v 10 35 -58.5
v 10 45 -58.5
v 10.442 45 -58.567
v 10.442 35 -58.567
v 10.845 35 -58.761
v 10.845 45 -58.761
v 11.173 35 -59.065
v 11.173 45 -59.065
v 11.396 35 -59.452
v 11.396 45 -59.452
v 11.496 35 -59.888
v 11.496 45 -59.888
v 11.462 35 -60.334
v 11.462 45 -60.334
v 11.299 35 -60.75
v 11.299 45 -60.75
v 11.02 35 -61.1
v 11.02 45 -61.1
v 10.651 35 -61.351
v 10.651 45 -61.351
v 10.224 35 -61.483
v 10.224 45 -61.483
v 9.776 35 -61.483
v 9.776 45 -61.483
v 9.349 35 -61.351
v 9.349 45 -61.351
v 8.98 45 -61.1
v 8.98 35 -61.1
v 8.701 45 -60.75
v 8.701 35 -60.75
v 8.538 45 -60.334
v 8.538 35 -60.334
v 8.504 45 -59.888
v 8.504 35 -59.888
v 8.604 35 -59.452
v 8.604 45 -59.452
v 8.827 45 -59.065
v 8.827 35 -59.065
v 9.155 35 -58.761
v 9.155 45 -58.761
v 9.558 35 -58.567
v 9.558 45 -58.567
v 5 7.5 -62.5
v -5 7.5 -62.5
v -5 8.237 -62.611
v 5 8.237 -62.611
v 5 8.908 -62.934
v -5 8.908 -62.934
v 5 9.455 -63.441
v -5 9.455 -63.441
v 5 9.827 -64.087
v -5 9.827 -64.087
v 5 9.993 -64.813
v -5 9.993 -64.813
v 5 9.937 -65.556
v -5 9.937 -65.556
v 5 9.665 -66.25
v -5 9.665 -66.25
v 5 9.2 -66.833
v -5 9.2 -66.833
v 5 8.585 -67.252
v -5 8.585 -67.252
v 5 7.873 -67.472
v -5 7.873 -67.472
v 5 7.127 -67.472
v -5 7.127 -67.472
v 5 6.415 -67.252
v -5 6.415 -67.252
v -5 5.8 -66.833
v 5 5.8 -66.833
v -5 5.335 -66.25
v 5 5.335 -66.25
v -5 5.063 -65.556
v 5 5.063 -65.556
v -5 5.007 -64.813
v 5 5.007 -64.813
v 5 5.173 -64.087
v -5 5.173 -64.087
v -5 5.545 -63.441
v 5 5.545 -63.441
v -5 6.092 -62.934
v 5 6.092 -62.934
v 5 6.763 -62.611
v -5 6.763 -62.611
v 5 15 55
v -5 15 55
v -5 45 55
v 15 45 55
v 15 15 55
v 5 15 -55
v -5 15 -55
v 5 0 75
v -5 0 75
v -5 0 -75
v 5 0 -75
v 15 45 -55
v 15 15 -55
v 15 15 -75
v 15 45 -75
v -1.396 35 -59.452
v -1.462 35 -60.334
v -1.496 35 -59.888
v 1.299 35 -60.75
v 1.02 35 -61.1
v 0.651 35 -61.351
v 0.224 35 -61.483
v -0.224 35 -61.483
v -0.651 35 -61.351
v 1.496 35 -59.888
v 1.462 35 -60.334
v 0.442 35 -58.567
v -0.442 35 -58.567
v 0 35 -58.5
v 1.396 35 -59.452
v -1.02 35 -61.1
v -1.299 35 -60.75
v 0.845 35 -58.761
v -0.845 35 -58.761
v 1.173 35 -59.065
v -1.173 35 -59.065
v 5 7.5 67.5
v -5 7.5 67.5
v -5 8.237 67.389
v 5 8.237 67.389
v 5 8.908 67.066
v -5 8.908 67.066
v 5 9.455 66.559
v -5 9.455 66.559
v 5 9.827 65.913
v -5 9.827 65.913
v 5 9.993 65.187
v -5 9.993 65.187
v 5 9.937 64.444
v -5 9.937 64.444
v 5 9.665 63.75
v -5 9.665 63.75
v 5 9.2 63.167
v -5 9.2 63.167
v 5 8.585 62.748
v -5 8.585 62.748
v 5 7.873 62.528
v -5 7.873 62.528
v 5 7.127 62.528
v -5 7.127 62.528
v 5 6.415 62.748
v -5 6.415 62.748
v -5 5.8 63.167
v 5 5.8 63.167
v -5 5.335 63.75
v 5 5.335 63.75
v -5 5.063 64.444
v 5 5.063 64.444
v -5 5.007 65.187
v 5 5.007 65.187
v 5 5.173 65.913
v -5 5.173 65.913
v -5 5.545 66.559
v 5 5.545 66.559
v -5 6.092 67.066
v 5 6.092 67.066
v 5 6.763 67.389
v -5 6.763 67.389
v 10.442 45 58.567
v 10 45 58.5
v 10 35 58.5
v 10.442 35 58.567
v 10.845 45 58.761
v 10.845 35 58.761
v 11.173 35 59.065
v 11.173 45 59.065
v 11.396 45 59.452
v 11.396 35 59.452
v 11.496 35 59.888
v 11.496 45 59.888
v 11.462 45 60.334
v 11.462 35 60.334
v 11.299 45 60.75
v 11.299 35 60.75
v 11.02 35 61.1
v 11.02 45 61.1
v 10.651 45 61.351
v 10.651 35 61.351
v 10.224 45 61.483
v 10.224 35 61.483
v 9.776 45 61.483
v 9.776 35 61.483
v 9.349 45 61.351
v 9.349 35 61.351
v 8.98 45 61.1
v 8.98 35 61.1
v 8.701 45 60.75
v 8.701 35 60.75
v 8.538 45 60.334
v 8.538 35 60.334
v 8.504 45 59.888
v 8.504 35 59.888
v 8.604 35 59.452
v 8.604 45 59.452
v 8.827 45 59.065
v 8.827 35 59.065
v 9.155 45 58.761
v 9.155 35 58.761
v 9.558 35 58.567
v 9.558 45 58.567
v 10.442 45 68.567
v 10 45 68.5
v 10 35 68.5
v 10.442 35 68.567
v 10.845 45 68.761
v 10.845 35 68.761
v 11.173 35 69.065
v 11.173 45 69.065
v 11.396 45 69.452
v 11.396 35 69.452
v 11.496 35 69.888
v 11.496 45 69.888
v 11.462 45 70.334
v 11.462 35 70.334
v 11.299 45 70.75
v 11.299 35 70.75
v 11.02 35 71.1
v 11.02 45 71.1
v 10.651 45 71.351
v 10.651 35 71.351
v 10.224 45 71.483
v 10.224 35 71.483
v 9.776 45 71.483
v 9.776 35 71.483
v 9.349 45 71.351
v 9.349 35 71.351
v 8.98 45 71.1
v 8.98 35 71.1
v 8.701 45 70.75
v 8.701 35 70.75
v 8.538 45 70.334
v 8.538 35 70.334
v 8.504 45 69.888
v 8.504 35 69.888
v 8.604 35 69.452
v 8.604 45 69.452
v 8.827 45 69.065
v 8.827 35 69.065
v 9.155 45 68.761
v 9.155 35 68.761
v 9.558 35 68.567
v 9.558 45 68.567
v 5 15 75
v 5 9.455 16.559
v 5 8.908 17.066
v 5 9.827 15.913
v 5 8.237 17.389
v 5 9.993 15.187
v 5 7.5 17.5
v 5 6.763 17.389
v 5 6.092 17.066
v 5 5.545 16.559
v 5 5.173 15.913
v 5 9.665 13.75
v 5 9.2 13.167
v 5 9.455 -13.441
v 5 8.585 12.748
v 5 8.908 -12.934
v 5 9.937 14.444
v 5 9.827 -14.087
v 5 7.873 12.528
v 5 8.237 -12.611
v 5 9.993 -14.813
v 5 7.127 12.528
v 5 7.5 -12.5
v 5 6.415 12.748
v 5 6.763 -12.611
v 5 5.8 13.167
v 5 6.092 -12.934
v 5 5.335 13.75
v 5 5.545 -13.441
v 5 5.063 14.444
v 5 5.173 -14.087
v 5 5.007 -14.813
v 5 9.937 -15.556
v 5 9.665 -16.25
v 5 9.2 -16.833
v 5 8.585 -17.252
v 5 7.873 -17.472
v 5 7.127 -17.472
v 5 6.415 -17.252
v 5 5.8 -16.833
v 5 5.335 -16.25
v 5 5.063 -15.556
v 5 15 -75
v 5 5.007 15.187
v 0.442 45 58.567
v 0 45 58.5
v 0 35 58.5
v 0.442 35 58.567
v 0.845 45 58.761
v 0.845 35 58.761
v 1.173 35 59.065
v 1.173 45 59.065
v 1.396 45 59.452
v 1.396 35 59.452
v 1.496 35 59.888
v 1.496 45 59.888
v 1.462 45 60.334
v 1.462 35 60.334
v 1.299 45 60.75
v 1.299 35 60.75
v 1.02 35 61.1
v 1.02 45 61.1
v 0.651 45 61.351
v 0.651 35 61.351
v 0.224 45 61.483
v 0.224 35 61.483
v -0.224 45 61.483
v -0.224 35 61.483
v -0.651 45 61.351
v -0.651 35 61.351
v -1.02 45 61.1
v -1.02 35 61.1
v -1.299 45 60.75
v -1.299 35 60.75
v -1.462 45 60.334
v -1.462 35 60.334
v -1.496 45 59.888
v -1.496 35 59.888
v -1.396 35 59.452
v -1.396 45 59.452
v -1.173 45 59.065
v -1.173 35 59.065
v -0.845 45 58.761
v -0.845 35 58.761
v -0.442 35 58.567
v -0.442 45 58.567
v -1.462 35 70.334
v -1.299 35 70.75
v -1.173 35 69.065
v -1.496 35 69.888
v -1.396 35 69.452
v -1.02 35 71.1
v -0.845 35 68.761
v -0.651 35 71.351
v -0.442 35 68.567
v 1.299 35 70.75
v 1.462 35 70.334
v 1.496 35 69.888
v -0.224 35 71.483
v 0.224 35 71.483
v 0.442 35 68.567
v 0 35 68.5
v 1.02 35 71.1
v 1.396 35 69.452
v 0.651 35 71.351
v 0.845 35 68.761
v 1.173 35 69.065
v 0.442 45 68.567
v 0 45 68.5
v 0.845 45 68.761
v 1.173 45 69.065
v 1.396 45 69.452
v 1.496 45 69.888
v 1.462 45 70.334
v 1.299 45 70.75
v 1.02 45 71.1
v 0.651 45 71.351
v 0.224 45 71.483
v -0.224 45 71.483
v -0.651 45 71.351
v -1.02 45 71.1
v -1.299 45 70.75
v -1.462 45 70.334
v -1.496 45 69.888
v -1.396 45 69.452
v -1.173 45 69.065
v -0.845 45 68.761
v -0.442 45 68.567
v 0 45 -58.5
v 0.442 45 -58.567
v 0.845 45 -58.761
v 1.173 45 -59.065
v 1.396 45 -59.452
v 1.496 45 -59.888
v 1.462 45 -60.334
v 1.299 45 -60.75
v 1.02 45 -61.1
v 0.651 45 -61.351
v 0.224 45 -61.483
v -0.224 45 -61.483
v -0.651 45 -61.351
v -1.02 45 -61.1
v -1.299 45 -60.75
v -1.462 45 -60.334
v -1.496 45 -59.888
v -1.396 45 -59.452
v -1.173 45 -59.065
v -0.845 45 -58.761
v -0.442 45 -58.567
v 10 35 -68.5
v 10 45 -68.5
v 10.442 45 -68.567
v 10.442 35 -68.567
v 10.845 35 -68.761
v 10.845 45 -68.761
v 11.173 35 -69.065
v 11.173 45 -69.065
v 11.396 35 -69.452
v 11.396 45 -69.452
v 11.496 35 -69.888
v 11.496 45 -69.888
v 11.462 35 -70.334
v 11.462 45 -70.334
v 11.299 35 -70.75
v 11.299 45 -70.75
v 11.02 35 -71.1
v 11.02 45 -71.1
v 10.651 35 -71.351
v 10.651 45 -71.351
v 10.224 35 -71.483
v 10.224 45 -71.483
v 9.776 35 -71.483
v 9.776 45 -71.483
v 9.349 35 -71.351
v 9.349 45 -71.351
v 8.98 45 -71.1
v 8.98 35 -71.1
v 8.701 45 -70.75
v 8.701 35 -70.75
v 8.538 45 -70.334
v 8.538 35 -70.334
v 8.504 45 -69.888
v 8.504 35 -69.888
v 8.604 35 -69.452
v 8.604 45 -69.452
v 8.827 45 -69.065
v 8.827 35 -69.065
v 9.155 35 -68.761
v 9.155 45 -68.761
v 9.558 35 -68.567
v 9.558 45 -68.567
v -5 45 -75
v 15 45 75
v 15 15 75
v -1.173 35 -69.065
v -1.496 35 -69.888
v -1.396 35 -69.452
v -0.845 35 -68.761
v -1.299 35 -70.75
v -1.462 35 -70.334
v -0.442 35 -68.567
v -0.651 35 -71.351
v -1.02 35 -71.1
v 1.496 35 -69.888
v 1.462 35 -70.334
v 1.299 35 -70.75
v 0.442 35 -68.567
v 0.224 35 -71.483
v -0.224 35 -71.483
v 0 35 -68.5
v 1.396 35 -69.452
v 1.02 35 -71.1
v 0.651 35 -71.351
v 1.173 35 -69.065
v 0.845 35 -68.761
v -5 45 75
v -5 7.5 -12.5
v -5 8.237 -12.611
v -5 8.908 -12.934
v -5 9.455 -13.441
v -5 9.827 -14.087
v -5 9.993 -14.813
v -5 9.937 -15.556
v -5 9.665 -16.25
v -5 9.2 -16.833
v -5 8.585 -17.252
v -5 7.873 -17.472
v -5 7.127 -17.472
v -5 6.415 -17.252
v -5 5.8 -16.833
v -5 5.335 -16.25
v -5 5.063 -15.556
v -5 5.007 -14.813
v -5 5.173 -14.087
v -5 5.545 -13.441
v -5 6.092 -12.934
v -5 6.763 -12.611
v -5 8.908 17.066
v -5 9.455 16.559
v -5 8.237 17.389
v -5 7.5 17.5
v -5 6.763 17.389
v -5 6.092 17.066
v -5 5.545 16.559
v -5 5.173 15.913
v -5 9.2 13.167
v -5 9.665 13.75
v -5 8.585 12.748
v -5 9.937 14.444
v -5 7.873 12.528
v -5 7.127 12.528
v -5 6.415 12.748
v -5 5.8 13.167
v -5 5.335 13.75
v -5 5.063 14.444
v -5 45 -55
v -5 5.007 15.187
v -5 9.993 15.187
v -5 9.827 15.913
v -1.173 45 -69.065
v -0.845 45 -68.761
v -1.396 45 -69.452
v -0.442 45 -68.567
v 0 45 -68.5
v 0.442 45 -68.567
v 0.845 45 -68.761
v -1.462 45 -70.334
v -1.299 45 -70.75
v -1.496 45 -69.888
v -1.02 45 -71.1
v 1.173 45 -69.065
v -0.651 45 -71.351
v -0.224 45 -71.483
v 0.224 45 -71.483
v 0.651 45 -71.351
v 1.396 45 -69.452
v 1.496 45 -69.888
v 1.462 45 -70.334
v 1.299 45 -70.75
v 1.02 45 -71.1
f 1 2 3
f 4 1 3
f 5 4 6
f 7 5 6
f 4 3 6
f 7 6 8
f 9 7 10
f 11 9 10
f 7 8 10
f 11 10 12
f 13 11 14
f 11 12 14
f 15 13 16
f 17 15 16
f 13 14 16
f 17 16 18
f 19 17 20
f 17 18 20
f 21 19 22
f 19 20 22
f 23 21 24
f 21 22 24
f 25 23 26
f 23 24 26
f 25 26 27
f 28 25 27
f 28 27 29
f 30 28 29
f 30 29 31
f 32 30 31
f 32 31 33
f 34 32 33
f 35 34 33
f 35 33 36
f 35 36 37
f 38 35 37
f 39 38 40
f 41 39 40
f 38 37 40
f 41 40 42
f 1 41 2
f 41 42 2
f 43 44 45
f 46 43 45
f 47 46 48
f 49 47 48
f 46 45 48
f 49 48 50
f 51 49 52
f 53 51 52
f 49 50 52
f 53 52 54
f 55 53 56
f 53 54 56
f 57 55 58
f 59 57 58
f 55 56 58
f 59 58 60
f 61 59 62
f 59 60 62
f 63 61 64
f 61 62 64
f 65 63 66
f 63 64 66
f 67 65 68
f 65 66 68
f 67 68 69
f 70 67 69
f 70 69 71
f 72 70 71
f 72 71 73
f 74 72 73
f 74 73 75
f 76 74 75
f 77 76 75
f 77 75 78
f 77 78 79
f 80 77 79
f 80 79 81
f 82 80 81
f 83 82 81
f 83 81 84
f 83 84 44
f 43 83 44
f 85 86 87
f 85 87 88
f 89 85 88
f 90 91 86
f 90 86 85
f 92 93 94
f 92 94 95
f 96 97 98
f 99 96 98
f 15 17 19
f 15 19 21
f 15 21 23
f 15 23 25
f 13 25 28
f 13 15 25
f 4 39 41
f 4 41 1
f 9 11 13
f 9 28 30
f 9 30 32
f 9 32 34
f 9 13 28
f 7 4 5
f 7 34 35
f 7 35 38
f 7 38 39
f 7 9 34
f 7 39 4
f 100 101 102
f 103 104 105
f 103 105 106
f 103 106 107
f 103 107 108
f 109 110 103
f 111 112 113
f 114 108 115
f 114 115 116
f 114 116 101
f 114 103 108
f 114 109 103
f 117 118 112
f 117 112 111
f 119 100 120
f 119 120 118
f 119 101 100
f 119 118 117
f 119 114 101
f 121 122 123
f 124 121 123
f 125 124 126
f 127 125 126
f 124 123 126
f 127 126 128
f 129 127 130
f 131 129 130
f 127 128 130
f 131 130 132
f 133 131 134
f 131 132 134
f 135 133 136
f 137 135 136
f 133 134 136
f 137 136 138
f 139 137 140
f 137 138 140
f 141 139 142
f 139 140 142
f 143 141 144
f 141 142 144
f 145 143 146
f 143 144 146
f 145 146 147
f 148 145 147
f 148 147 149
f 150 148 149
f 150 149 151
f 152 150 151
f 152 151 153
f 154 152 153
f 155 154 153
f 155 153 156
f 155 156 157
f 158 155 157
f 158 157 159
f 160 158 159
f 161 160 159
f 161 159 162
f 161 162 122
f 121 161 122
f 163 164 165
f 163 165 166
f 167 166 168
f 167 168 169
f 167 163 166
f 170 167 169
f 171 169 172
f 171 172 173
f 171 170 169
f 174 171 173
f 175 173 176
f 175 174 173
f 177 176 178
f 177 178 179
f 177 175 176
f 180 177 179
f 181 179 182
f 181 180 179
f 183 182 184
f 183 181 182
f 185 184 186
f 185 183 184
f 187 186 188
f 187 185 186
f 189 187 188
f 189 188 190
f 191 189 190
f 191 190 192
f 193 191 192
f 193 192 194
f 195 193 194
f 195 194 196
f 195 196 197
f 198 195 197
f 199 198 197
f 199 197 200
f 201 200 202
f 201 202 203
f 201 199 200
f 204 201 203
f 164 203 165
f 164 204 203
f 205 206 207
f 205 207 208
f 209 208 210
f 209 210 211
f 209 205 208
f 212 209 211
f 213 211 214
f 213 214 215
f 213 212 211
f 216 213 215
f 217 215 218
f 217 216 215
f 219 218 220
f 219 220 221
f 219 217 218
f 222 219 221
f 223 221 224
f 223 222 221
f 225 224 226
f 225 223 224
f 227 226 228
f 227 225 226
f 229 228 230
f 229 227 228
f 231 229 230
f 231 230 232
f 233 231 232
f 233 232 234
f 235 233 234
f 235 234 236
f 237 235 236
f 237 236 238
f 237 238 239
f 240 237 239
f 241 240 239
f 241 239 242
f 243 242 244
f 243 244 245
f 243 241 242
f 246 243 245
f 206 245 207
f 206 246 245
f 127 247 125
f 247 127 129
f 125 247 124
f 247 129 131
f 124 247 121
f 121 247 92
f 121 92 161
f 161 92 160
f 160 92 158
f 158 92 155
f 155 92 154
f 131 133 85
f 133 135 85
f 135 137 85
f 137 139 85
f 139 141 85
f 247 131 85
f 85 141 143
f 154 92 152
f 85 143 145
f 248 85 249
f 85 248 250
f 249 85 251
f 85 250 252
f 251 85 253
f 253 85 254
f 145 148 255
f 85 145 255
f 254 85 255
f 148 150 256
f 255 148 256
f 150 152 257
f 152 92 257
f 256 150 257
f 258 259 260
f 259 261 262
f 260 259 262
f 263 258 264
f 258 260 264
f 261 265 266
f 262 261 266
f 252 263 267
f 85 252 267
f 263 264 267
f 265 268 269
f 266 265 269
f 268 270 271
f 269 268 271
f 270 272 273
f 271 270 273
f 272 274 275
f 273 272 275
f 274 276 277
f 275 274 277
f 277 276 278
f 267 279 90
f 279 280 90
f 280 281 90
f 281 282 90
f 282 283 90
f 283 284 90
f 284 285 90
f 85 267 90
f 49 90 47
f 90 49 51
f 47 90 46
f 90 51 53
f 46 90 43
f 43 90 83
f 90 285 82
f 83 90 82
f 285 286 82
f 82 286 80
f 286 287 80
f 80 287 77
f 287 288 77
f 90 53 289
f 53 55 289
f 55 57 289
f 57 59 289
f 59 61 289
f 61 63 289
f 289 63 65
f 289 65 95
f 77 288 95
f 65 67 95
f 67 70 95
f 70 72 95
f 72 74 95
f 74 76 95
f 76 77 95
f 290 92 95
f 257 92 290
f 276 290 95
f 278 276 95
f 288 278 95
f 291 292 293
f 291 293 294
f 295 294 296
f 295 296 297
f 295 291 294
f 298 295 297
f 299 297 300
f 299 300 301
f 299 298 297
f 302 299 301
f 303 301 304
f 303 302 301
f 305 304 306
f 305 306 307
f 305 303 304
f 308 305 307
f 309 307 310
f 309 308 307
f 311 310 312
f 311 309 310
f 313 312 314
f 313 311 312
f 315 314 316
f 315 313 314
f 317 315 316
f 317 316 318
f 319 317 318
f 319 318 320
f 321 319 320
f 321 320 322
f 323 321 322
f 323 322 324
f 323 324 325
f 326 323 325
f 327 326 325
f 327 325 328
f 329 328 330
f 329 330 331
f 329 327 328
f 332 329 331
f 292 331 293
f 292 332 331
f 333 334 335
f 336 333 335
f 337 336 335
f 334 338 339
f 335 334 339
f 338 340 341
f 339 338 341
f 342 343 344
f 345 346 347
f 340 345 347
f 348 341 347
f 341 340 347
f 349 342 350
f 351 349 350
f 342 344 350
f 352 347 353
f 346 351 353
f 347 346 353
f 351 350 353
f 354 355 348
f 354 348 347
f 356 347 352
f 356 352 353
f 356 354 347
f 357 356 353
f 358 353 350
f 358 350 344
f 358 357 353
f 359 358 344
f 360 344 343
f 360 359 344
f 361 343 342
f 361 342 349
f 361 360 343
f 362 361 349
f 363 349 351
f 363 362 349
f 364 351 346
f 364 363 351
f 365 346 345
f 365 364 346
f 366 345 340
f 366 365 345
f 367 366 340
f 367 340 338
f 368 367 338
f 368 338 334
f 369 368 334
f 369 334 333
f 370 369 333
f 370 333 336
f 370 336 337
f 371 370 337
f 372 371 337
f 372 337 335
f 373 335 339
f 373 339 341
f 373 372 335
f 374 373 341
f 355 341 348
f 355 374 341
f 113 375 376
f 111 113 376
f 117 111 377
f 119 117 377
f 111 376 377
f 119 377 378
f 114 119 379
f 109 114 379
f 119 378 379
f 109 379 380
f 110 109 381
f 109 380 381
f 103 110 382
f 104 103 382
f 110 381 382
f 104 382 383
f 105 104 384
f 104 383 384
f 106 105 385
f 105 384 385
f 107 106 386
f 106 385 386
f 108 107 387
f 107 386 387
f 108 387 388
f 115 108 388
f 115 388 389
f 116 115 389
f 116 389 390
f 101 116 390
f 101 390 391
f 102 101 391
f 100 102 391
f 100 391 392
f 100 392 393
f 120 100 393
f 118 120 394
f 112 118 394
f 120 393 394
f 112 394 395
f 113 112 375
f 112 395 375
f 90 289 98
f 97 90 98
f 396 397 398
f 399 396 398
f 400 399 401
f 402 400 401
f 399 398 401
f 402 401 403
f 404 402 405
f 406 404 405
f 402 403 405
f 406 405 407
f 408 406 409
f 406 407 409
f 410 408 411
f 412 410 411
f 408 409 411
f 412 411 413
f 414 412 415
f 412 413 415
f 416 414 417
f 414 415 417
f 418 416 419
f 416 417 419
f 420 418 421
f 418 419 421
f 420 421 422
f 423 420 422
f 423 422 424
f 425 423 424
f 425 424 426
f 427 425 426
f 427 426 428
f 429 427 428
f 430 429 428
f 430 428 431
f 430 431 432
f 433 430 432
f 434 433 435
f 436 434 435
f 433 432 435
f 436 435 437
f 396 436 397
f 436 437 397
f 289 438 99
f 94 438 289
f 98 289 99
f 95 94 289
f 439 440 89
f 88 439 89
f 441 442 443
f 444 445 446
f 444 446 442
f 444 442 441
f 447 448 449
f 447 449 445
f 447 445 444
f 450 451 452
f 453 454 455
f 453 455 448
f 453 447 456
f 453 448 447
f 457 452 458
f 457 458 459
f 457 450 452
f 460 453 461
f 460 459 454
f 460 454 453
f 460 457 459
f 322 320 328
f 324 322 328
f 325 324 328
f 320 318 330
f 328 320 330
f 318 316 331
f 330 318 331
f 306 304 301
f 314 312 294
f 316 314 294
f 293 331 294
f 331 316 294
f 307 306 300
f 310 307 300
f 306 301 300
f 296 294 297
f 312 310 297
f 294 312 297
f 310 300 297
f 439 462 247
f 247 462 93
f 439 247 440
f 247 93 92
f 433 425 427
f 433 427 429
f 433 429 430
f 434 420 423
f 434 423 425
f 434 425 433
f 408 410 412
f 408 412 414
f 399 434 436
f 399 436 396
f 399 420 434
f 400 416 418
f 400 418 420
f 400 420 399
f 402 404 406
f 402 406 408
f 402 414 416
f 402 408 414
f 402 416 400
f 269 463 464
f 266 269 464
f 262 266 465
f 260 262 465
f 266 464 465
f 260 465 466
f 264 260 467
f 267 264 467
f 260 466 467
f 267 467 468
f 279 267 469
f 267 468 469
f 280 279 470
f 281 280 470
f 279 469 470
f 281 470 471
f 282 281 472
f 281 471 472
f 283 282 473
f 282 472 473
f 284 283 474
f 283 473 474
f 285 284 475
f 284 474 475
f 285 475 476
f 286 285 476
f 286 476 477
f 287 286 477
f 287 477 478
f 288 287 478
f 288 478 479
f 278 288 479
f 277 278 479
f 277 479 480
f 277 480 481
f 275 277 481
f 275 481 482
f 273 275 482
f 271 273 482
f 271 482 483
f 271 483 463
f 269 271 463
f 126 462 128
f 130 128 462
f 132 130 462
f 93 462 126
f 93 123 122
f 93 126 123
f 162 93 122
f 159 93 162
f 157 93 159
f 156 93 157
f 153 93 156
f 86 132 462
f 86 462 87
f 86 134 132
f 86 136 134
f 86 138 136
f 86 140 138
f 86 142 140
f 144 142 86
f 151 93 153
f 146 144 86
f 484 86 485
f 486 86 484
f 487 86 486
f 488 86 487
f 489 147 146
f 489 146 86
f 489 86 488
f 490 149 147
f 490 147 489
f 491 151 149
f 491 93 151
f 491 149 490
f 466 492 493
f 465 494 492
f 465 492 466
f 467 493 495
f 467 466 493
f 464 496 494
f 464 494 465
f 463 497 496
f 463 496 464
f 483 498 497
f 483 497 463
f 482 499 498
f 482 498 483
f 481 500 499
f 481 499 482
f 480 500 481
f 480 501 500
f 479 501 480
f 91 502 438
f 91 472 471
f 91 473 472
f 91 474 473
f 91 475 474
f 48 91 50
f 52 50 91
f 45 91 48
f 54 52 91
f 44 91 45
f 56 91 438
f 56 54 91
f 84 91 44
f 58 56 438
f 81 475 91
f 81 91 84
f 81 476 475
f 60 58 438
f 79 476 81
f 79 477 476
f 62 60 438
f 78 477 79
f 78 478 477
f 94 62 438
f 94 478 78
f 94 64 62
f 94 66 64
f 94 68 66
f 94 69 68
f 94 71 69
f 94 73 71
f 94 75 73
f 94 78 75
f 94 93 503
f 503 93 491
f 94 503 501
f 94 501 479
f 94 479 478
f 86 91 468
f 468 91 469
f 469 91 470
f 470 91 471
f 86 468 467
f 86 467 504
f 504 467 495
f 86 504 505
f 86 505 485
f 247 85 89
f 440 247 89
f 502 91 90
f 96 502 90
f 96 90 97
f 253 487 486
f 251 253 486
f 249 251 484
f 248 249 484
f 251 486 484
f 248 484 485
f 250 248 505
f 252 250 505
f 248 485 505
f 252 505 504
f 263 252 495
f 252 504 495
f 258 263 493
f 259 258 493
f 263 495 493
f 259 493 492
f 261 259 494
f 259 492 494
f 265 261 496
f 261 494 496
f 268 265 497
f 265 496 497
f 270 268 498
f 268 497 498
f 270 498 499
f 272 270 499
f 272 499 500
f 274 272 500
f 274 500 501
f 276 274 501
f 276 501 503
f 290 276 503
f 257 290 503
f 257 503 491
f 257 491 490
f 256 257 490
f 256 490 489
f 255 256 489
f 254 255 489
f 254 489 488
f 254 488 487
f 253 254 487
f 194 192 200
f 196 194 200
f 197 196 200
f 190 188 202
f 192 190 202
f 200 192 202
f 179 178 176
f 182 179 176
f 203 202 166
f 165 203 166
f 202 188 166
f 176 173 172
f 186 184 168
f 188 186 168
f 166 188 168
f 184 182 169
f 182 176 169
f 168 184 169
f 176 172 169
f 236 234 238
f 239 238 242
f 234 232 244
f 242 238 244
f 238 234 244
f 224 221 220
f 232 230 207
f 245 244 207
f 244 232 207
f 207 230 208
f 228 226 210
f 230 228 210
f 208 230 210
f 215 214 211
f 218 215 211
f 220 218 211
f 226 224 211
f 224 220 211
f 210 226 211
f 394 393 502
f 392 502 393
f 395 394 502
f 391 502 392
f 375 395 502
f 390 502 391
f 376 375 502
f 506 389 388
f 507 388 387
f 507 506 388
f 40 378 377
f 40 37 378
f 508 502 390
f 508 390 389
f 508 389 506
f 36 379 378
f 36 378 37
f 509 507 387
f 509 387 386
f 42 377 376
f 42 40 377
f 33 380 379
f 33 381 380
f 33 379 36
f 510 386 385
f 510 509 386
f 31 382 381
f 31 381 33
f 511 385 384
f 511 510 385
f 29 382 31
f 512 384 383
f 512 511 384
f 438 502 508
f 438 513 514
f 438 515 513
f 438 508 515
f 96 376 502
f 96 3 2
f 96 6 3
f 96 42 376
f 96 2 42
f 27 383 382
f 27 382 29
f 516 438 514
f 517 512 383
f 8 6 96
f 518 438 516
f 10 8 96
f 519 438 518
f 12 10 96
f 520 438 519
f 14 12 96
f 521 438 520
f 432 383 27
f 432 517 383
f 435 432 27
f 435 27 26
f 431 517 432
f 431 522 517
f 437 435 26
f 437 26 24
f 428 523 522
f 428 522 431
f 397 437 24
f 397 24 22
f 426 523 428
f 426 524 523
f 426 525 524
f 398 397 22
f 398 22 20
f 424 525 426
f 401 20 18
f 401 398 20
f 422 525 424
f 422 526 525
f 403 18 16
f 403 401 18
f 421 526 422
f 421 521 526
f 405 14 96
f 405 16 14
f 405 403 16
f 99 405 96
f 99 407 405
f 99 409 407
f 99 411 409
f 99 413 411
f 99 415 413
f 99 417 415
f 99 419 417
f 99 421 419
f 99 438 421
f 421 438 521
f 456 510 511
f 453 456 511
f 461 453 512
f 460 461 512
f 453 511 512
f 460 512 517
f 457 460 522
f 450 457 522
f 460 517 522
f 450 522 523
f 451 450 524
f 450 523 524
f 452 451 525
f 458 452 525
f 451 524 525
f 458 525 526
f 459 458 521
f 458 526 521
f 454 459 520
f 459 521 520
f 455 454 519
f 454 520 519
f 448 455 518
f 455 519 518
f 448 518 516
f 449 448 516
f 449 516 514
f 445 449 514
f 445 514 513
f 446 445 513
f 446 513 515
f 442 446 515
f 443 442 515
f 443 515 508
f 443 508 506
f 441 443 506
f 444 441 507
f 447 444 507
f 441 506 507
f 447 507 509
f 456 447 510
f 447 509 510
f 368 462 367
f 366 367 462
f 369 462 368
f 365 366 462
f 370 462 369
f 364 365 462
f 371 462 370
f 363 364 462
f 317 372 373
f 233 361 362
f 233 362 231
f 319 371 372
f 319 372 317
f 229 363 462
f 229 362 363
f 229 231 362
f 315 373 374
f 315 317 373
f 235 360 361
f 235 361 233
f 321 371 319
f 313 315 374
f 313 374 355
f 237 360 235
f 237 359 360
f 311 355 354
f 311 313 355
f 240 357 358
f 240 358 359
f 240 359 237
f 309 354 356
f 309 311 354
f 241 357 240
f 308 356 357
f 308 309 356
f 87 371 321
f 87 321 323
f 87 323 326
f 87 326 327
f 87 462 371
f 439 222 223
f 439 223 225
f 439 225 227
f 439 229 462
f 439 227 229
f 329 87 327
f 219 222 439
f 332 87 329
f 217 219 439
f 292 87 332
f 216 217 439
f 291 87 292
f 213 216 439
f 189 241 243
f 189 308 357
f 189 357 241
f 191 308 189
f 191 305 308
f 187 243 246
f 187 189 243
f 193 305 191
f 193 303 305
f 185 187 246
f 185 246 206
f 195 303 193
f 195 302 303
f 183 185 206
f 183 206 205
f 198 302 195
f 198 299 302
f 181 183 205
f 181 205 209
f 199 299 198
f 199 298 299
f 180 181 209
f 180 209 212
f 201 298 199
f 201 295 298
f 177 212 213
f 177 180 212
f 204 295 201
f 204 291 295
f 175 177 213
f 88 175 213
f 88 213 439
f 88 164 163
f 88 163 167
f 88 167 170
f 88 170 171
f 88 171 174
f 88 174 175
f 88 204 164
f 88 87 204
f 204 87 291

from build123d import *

# Parameters (mm, degrees)
SKETCH_1_W          = 10
SKETCH_1_H          = 150
EXTRUDE_1_DEPTH     = 15
SKETCH_2_W          = 20
SKETCH_2_H          = 20
EXTRUDE_2_DEPTH     = 30
SKETCH_3_R          = 2.5
CUT_EXTRUDE_1_DEPTH = 90.721792225
SKETCH_4_R          = 1.5
CUT_EXTRUDE_2_DEPTH = 10


with BuildPart() as part:
    # 草图1 → 凸台-拉伸1 (new body)
    with BuildSketch(Plane(origin=(0, 0, 0), x_dir=(1, 0, 0), z_dir=(0, 1, 0))):
        Rectangle(SKETCH_1_W, SKETCH_1_H)
    extrude(amount=EXTRUDE_1_DEPTH)

    # 草图2 → 凸台-拉伸2 (add)
    with BuildSketch(Plane(origin=(0, 15, 0), x_dir=(1, 0, 0), z_dir=(0, 1, 0))):
        with Locations((5, 65)):
            Rectangle(SKETCH_2_W, SKETCH_2_H)
        with Locations((5, -65)):
            Rectangle(SKETCH_2_W, SKETCH_2_H)
    extrude(amount=EXTRUDE_2_DEPTH)

    # 草图3 → 切除-拉伸1 (cut, through all)
    with BuildSketch(Plane.ZY.offset(5)):
        with Locations((-65, 7.5)):
            Circle(SKETCH_3_R)
        with Locations((-15, 7.5)):
            Circle(SKETCH_3_R)
        with Locations((15, 7.5)):
            Circle(SKETCH_3_R)
        with Locations((65, 7.5)):
            Circle(SKETCH_3_R)
    extrude(amount=-CUT_EXTRUDE_1_DEPTH, mode=Mode.SUBTRACT)

    # 草图4 → 切除-拉伸2 (cut)
    with BuildSketch(Plane(origin=(0, 45, 0), x_dir=(1, 0, 0), z_dir=(0, 1, 0))):
        with Locations(Location((0, 70, 0), (0, 0, 270))):
            Circle(SKETCH_4_R)
        with Locations(Location((10, 70, 0), (0, 0, 270))):
            Circle(SKETCH_4_R)
        with Locations(Location((0, 60, 0), (0, 0, 270))):
            Circle(SKETCH_4_R)
        with Locations(Location((10, 60, 0), (0, 0, 270))):
            Circle(SKETCH_4_R)
    cut_extrude_2 = extrude(amount=-CUT_EXTRUDE_2_DEPTH, mode=Mode.SUBTRACT)

    # 镜向1: 切除-拉伸2 across plane
    add(cut_extrude_2.mirror(Plane.XY), mode=Mode.SUBTRACT)


solid = part.part
